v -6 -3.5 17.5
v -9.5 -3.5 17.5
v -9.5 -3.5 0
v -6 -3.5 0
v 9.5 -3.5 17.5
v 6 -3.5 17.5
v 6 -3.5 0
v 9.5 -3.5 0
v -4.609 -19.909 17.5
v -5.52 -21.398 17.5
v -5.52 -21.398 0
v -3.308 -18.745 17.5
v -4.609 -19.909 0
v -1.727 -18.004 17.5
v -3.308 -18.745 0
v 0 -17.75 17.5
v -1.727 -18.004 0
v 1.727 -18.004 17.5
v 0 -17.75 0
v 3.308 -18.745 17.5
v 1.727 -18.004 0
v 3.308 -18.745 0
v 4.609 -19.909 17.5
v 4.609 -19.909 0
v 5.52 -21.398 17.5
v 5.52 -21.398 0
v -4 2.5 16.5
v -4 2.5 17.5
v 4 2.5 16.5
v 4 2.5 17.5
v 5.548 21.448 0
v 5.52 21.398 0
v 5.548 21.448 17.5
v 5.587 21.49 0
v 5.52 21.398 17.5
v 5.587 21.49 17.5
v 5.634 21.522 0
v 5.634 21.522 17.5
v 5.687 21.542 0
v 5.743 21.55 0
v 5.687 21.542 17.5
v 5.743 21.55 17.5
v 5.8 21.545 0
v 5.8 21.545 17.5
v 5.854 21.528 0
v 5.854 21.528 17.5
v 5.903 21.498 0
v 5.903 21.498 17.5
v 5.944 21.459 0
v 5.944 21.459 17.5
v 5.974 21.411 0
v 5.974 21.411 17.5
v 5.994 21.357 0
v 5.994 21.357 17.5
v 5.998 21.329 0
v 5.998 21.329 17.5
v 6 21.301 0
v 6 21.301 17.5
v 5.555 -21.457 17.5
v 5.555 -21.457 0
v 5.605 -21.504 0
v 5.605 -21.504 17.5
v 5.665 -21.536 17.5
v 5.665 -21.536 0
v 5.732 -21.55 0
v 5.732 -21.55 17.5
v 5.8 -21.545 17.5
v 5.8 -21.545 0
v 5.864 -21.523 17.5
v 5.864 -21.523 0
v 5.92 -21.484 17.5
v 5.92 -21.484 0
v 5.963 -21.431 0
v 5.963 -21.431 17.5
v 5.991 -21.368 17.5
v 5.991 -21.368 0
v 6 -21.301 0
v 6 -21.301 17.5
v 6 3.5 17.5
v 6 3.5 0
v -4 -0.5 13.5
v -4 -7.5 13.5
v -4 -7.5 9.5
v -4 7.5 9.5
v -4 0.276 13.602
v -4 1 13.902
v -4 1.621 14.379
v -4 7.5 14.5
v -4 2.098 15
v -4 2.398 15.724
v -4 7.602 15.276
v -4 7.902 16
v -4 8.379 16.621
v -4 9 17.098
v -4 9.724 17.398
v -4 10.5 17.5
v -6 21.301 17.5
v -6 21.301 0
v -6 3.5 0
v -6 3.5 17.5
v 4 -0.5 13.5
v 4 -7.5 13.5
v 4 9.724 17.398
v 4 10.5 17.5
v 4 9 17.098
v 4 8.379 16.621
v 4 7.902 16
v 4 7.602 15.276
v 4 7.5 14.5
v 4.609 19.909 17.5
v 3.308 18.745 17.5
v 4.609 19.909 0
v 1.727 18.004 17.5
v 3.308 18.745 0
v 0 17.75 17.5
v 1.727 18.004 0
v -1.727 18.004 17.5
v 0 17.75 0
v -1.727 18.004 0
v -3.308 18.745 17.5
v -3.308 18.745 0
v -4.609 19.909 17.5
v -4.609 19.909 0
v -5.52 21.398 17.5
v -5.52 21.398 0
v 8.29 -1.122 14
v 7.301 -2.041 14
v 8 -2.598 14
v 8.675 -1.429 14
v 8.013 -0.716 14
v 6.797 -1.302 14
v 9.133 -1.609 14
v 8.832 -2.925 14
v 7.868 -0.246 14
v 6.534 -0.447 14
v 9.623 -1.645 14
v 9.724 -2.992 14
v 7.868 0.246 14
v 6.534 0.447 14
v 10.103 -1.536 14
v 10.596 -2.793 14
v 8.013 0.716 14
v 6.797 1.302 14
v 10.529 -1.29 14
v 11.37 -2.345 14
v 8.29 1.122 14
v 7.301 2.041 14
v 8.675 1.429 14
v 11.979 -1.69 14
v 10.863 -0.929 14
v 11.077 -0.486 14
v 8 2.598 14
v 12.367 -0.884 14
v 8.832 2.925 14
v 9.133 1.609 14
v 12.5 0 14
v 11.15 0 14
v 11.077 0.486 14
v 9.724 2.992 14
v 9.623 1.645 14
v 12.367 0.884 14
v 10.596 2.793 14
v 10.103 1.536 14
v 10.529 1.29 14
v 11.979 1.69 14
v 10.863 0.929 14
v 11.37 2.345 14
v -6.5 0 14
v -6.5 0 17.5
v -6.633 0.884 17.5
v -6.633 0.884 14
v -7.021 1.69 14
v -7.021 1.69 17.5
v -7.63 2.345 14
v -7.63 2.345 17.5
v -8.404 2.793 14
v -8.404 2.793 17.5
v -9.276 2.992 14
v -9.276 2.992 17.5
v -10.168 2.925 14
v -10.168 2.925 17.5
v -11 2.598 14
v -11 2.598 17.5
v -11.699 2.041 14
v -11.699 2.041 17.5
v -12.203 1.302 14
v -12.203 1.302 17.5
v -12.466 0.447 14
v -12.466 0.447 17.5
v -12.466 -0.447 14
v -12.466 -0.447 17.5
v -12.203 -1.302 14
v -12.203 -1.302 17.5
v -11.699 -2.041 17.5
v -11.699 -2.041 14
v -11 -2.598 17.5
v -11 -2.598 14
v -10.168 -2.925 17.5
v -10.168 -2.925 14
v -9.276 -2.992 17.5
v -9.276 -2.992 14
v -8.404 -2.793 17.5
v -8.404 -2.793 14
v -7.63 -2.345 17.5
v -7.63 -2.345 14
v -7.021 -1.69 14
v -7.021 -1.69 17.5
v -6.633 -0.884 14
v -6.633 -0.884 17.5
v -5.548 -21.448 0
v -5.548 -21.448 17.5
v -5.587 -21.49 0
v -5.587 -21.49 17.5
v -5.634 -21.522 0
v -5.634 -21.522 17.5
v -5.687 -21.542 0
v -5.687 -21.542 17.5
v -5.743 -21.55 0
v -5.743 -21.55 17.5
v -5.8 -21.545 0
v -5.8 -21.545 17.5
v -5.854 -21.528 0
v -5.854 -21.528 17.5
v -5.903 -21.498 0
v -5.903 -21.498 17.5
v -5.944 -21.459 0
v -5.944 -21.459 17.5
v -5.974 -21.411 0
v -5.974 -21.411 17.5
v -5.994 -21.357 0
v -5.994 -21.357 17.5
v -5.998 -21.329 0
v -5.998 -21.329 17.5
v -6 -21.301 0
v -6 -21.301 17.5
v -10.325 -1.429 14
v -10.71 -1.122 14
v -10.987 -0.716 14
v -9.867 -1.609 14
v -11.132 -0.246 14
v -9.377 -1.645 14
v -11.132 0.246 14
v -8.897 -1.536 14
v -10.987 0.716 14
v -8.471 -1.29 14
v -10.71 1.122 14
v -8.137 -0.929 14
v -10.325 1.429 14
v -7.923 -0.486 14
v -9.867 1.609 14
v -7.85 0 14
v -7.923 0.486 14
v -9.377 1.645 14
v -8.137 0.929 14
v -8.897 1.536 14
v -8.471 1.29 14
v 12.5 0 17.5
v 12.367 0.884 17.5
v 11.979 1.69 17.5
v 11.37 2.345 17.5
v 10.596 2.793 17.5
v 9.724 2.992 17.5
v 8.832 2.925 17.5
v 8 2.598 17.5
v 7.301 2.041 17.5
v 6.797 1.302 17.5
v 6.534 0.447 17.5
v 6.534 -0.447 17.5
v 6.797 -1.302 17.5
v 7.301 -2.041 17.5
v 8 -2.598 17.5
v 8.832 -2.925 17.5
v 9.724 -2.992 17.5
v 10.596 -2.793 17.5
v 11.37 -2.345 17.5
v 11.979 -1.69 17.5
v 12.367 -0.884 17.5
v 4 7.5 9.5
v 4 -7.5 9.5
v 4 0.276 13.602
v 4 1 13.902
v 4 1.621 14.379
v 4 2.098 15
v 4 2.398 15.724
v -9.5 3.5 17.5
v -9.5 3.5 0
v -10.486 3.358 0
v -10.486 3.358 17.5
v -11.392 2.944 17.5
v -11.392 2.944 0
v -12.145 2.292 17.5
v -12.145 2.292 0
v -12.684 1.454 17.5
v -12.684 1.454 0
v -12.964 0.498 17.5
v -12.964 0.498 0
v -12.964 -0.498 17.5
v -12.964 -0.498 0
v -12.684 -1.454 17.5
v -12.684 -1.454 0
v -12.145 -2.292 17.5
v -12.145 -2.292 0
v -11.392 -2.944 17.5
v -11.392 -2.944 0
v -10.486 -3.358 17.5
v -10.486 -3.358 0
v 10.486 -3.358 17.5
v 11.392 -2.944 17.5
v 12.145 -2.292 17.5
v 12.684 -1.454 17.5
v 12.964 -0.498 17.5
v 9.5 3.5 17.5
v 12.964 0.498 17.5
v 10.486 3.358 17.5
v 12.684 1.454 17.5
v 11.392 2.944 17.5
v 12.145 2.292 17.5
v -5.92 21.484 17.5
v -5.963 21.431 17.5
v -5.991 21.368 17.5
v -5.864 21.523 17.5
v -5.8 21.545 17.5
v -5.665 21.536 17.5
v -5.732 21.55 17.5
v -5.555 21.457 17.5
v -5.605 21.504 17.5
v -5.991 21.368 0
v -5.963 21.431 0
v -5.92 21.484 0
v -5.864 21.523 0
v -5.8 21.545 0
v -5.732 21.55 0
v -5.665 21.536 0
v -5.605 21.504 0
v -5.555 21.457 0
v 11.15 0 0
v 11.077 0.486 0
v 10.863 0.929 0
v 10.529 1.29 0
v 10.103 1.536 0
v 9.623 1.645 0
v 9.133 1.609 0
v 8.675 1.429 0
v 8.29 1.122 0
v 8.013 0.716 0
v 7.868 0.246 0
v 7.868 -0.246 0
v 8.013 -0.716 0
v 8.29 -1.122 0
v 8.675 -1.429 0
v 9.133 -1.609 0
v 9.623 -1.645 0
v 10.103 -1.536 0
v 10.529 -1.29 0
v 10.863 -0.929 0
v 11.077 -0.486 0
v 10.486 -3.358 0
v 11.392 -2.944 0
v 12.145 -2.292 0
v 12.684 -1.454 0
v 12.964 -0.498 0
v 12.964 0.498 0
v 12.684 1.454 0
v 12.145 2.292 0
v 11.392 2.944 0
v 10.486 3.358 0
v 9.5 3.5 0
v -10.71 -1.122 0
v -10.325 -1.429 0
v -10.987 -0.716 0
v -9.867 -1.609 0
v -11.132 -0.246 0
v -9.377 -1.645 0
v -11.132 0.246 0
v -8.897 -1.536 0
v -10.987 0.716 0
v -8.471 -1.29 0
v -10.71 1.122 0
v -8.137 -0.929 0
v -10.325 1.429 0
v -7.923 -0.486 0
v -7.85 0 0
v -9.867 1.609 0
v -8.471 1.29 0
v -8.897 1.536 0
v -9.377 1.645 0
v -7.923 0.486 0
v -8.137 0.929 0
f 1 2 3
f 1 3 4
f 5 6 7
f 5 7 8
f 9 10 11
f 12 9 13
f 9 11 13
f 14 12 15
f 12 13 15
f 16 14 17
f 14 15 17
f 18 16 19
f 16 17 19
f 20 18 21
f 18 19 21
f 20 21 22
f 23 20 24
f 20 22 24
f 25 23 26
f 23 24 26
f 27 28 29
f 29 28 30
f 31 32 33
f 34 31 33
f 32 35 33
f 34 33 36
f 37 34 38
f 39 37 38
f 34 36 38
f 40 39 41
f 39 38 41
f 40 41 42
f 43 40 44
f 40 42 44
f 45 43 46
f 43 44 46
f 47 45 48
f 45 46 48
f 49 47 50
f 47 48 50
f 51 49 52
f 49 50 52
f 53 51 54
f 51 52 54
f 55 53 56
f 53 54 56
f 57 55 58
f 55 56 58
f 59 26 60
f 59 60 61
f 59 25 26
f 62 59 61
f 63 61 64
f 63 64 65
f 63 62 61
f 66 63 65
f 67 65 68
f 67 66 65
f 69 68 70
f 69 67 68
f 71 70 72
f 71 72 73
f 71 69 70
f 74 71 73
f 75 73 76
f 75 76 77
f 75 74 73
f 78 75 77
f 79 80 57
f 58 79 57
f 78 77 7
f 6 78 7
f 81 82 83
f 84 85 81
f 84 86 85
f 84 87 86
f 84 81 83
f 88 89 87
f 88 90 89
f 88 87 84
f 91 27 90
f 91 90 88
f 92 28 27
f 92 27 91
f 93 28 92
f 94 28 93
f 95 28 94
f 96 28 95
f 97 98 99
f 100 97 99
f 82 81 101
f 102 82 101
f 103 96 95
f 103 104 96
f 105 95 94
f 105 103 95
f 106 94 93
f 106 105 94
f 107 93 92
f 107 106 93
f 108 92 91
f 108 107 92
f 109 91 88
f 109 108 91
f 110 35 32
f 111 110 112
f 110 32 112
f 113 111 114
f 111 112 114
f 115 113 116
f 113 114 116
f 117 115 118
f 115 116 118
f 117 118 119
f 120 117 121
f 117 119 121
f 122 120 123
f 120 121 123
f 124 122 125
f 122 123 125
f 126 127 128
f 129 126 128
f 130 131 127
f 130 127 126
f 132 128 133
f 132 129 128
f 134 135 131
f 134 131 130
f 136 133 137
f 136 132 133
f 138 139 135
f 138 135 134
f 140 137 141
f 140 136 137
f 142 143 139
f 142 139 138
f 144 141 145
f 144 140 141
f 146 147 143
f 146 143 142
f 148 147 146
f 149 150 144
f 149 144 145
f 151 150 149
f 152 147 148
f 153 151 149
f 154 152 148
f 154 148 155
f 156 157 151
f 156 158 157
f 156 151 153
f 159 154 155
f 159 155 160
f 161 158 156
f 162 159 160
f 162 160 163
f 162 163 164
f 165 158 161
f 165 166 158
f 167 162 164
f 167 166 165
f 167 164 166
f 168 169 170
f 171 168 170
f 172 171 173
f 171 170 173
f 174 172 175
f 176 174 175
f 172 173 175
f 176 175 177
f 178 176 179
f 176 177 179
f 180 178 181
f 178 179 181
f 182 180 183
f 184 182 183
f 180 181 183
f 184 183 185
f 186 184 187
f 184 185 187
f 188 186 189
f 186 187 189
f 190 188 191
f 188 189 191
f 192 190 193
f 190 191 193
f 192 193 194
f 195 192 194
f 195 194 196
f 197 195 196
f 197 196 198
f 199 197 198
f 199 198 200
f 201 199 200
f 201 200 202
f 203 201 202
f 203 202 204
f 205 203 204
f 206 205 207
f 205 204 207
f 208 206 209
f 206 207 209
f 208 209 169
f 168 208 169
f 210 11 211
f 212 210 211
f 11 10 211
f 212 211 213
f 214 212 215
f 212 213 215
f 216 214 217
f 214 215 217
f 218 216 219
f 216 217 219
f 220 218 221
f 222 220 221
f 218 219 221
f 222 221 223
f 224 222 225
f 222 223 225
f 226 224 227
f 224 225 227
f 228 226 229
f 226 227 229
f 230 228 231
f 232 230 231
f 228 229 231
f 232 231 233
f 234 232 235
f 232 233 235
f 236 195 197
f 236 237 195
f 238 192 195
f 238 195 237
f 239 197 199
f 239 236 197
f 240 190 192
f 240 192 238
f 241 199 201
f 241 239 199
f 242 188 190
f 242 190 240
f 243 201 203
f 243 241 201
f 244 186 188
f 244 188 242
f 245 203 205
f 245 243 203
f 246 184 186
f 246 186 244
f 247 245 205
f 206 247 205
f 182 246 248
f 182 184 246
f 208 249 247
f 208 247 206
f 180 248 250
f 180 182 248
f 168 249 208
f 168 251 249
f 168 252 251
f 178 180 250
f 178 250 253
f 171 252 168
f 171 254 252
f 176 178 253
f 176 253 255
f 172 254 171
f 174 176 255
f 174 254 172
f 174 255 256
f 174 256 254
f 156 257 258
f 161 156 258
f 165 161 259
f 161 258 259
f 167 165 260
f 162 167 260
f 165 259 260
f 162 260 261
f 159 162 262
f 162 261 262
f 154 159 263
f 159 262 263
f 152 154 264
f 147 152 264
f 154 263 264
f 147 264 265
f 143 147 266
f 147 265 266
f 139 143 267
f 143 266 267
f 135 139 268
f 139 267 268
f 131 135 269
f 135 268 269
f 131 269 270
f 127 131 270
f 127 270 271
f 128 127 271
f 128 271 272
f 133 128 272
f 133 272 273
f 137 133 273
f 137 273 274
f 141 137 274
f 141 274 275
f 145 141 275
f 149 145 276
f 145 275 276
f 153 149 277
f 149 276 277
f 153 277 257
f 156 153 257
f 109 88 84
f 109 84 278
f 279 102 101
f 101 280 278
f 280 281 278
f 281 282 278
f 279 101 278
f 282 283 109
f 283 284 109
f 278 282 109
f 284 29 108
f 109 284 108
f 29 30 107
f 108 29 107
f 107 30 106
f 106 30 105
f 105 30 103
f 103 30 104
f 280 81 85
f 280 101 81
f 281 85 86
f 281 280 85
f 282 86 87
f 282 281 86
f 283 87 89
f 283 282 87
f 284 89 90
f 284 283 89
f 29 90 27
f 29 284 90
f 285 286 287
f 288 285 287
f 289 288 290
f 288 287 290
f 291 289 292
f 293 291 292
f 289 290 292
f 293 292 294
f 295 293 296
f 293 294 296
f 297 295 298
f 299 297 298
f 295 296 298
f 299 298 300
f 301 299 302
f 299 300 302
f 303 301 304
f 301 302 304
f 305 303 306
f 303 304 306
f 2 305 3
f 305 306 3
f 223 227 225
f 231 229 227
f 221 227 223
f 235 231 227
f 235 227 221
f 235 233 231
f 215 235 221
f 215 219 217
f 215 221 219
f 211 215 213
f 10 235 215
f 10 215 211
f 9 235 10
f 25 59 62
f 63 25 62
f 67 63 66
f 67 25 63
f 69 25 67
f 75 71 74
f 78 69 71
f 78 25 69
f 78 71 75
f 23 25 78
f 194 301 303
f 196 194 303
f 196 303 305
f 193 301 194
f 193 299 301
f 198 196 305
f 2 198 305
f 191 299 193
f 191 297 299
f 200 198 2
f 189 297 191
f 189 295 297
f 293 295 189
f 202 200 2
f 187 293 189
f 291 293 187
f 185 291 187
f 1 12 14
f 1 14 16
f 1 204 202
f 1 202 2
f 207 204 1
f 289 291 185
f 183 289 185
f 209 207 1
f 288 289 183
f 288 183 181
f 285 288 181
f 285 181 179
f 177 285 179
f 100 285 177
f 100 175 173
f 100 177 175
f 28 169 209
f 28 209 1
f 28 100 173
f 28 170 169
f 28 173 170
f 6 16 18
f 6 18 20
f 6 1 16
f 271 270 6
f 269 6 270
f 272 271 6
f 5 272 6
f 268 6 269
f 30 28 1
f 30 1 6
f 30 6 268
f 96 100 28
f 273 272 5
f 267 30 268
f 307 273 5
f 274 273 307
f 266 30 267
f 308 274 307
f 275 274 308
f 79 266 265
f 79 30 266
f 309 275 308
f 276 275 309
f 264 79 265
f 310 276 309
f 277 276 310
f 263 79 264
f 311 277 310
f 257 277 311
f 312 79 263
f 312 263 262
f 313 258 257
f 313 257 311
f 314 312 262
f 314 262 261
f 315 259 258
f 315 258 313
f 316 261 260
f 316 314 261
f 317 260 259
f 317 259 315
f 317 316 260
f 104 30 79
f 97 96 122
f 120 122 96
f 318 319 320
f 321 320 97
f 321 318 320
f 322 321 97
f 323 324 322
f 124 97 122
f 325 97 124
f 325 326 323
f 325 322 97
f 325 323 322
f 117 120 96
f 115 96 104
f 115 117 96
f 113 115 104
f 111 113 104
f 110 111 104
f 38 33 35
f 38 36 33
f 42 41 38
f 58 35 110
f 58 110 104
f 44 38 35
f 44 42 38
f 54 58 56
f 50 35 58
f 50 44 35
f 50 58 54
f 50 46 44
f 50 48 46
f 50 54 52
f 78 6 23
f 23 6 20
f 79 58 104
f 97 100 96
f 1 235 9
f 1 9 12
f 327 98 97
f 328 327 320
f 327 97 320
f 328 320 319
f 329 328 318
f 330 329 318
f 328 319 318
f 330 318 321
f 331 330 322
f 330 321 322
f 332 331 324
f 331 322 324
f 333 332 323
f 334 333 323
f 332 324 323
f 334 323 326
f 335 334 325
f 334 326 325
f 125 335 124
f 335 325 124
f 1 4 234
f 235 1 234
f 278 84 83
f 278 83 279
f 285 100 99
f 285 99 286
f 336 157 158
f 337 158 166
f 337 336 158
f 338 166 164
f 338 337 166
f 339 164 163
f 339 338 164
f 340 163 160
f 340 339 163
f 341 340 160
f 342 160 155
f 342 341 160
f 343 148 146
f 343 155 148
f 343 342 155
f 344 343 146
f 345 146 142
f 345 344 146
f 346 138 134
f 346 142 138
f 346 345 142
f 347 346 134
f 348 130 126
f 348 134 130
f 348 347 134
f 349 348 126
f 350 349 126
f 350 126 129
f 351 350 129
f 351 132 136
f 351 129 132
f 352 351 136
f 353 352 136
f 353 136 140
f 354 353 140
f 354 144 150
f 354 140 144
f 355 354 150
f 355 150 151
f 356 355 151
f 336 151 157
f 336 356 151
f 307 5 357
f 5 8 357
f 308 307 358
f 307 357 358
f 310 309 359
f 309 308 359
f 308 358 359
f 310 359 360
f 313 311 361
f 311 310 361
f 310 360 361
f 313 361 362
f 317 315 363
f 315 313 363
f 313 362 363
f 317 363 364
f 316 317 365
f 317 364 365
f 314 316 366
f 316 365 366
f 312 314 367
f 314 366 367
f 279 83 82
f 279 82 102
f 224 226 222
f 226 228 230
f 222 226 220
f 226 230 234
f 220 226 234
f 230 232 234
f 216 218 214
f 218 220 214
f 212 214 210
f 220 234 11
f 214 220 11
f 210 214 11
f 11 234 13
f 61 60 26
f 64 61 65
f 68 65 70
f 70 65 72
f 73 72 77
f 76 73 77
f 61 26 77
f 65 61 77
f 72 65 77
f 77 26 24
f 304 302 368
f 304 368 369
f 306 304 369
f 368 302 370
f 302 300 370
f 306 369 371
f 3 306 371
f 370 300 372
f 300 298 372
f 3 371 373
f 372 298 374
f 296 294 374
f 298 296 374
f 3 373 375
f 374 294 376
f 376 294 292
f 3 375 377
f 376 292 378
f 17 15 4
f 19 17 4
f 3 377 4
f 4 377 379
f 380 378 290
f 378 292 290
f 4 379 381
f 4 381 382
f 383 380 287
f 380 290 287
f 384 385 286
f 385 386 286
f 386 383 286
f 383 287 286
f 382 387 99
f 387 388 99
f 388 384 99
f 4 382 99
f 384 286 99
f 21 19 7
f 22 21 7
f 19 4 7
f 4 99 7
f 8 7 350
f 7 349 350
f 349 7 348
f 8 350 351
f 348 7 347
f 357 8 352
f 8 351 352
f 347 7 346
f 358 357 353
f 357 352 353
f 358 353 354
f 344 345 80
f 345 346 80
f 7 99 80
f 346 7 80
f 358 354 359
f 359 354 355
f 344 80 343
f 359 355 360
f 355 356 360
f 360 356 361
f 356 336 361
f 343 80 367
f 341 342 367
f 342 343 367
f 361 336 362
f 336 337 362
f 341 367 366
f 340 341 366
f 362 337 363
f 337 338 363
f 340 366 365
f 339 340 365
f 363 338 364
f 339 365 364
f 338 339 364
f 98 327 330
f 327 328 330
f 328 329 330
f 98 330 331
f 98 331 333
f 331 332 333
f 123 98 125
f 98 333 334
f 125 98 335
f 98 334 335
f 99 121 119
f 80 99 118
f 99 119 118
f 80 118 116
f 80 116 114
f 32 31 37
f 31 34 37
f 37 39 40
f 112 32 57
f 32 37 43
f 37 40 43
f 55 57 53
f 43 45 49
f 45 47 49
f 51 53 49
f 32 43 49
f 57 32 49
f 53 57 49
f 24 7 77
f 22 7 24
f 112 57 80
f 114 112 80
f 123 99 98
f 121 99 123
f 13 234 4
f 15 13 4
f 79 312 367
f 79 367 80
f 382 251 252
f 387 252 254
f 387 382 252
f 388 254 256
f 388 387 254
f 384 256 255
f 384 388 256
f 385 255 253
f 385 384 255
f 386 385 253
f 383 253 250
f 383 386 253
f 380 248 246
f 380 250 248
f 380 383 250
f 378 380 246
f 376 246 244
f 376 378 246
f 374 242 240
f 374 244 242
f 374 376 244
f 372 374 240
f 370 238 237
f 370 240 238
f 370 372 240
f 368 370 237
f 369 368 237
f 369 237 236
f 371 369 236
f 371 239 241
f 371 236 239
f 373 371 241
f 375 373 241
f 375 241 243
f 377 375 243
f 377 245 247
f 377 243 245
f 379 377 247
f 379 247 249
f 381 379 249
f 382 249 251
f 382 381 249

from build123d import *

# Parameters (mm, degrees)
SKETCH1_R                       = 1.65
BOSS_EXTRUDE1_DEPTH             = 17.5
FILLET1_R                       = 0.25
SKIZZE1_W                       = 8
SKIZZE1_H                       = 5
SCHNITT_LINEAR_AUSTRAGEN1_DEPTH = 8
SKIZZE2_W                       = 8
SKIZZE2_H                       = 4
SCHNITT_LINEAR_AUSTRAGEN2_DEPTH = 10
VERRUNDUNG1_R                   = 3
SKIZZE3_R                       = 3
SCHNITT_LINEAR_AUSTRAGEN3_DEPTH = 3.5


with BuildPart() as part:
    # Sketch1 → Boss-Extrude1 (new body)
    with BuildSketch(Plane.XY):
        with BuildLine():
            Line((-6, -3.5), (-6, -23.75))
            ThreePointArc((-6, -23.75), (0, -17.75), (6, -23.75))
            Line((6, -23.75), (6, -3.5))
            Line((6, -3.5), (9.5, -3.5))
            ThreePointArc((9.5, -3.5), (13, 0), (9.5, 3.5))
            Line((9.5, 3.5), (6, 3.5))
            Line((6, 3.5), (6, 23.75))
            ThreePointArc((6, 23.75), (0, 17.75), (-6, 23.75))
            Line((-6, 23.75), (-6, 3.5))
            Line((-6, 3.5), (-9.5, 3.5))
            ThreePointArc((-9.5, 3.5), (-13, 0), (-9.5, -3.5))
            Line((-9.5, -3.5), (-6, -3.5))
        make_face()
        with Locations((-9.5, 0)):
            Circle(SKETCH1_R, mode=Mode.SUBTRACT)
        with Locations((9.5, 0)):
            Circle(SKETCH1_R, mode=Mode.SUBTRACT)
    extrude(amount=BOSS_EXTRUDE1_DEPTH)

    # Fillet1
    fillet1_edges = [part.edges().sort_by_distance(p)[0] for p in [
        (6, -23.75, 8.75),
        (6, 23.75, 8.75),
        (-6, 23.75, 8.75),
    ]]
    fillet(fillet1_edges, radius=FILLET1_R)
    fillet1_2_edges = [part.edges().sort_by_distance(p)[0] for p in [
        (-6, -23.75, 8.75),
    ]]
    fillet(fillet1_2_edges, radius=FILLET1_R)

    # Skizze1 → Schnitt-Linear austragen1 (cut)
    with BuildSketch(Plane.XY.offset(17.5)):
        with Locations((0, 5)):
            Rectangle(SKIZZE1_W, SKIZZE1_H)
    extrude(amount=-SCHNITT_LINEAR_AUSTRAGEN1_DEPTH, mode=Mode.SUBTRACT)

    # Skizze2 → Schnitt-Linear austragen2 (cut)
    with BuildSketch(Plane(origin=(0, 2.5, 0), x_dir=(1, 0, 0), z_dir=(0, 1, 0))):
        with Locations((0, -11.5)):
            Rectangle(SKIZZE2_W, SKIZZE2_H)
    extrude(amount=-SCHNITT_LINEAR_AUSTRAGEN2_DEPTH, mode=Mode.SUBTRACT)

    # Verrundung1
    verrundung1_edges = [part.edges().sort_by_distance(p)[0] for p in [
        (0, 7.5, 17.5),
        (0, 2.5, 13.5),
    ]]
    fillet(verrundung1_edges, radius=VERRUNDUNG1_R)

    # Skizze3 → Schnitt-Linear austragen3 (cut)
    with BuildSketch(Plane.XY.offset(17.5)):
        with Locations((-9.5, 0)):
            Circle(SKIZZE3_R)
        with Locations((9.5, 0)):
            Circle(SKIZZE3_R)
    extrude(amount=-SCHNITT_LINEAR_AUSTRAGEN3_DEPTH, mode=Mode.SUBTRACT)


solid = part.part
